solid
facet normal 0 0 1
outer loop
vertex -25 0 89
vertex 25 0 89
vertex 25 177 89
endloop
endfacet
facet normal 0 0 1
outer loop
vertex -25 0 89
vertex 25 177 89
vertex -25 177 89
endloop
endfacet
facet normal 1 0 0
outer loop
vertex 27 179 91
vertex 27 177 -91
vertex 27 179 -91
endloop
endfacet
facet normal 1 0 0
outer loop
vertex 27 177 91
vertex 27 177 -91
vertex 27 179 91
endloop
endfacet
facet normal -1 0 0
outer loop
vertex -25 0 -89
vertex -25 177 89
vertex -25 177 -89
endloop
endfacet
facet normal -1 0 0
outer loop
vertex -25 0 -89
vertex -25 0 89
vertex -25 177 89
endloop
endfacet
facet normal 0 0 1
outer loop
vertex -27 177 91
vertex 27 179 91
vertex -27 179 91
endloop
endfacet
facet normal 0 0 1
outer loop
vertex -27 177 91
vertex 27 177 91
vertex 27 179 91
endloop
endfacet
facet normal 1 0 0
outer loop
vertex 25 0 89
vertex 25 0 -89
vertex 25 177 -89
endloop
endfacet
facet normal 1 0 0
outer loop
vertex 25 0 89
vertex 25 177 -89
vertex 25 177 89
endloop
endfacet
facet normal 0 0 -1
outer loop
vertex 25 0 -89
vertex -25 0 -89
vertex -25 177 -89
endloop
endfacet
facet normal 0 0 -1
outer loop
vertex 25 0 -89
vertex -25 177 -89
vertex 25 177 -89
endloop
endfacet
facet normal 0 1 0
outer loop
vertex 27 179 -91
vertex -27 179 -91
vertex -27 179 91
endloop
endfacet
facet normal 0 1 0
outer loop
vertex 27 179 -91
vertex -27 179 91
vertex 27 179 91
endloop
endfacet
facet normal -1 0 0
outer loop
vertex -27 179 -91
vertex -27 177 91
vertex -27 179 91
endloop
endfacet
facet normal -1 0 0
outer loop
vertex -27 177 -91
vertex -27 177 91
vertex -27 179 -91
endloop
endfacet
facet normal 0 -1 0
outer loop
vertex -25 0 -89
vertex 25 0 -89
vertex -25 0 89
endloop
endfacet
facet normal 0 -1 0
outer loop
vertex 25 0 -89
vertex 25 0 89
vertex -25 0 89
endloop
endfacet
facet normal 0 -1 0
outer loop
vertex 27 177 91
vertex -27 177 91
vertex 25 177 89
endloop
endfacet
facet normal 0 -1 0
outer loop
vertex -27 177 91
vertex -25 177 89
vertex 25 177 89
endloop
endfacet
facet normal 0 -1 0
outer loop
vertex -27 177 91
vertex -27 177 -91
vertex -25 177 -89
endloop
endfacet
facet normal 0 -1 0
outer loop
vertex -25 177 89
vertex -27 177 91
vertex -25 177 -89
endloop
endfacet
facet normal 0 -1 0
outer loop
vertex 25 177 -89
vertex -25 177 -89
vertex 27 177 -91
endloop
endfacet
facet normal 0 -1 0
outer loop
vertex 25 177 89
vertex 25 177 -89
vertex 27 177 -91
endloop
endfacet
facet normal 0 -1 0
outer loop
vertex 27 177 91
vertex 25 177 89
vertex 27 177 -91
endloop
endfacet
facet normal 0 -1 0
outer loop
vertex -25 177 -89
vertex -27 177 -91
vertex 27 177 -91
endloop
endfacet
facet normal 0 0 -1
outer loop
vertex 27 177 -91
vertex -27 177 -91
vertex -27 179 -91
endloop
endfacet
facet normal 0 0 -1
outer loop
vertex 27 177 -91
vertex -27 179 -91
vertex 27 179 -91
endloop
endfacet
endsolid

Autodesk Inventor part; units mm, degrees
ref_plane "YZ Plane" through (0, 0, 0) normal (1, 0, 0) x (0, 1, 0)
ref_plane "XZ Plane" through (0, 0, 0) normal (0, 1, 0) x (-1, 0, 0)
ref_plane "XY Plane" through (0, 0, 0) normal (0, 0, 1) x (1, 0, 0)
sketch "Sketch1" plane through (0, 0, 0) normal (0, 1, 0) x (-1, 0, 0)
  line L0 (-25, 89) -> (25, 89)
  line L1 (25, 89) -> (25, -89)
  line L2 (25, -89) -> (-25, -89)
  line L3 (-25, -89) -> (-25, 89)
  line L4 (-25, 89) -> (25, -89) construction
  line L5 (25, 89) -> (-25, -89) construction
  point P0 (0, 0)
  dimension "d0" = 178
  dimension "d1" = 50
extrude "Extrusion1" add sketch "Sketch1" along normal blind 177
sketch "Sketch2" plane through (0, 177, 0) normal (0, 1, 0) x (1, 0, 0)
  line L0 (27, -91) -> (-27, -91)
  line L1 (-27, -91) -> (-27, 91)
  line L2 (-27, 91) -> (27, 91)
  line L3 (27, 91) -> (27, -91)
  line L4 (27, -91) -> (-27, 91) construction
  line L5 (-27, -91) -> (27, 91) construction
  line L6 (25, 89) -> (-25, 89) projected
  line L7 (-25, 89) -> (-25, -89) projected
  point P0 (0, 0)
  dimension "d4" = 2
  dimension "d5" = 2
extrude "Extrusion2" add sketch "Sketch2" along normal blind 2
sketch "Sketch3" plane through (0, 179, 0) normal (0, 1, 0) x (1, 0, 0)
  line L0 (-28.0615, -91.1516) -> (-28.0615, 90.8484) construction
  line L1 (-28.0615, 90.8484) -> (28.3189, 90.8484) construction
  line L2 (28.3189, 90.8484) -> (28.3189, -91.1516) construction
  line L3 (28.3189, -91.1516) -> (-28.0615, -91.1516) construction
equation "\"d0\" = l_stereo"
equation "\"d1\" = w_stereo"
equation "\"d2\" = d_stereo"
equation "\"d5\" = d4"
equation "\"wl_panel\" = 285"
equation "\"t_panel\" = 8"
equation "\"r_button\" = 8"
equation "\"l_stereo\" = 178"
equation "\"w_stereo\" = 50"
equation "\"d_stereo\" = 177"
equation "\"w_label\" = 15"
equation "\"r_labelscrew\" = 2.5"
equation "\"ro_labelscrew\" = 5"
equation "\"l_buttontobutton\" = 25"
equation "\"r_usboutlet\" = 29"
equation "\"l_fastener_button\" = 19"
properties part number "stereo" material "Stainless Steel"
